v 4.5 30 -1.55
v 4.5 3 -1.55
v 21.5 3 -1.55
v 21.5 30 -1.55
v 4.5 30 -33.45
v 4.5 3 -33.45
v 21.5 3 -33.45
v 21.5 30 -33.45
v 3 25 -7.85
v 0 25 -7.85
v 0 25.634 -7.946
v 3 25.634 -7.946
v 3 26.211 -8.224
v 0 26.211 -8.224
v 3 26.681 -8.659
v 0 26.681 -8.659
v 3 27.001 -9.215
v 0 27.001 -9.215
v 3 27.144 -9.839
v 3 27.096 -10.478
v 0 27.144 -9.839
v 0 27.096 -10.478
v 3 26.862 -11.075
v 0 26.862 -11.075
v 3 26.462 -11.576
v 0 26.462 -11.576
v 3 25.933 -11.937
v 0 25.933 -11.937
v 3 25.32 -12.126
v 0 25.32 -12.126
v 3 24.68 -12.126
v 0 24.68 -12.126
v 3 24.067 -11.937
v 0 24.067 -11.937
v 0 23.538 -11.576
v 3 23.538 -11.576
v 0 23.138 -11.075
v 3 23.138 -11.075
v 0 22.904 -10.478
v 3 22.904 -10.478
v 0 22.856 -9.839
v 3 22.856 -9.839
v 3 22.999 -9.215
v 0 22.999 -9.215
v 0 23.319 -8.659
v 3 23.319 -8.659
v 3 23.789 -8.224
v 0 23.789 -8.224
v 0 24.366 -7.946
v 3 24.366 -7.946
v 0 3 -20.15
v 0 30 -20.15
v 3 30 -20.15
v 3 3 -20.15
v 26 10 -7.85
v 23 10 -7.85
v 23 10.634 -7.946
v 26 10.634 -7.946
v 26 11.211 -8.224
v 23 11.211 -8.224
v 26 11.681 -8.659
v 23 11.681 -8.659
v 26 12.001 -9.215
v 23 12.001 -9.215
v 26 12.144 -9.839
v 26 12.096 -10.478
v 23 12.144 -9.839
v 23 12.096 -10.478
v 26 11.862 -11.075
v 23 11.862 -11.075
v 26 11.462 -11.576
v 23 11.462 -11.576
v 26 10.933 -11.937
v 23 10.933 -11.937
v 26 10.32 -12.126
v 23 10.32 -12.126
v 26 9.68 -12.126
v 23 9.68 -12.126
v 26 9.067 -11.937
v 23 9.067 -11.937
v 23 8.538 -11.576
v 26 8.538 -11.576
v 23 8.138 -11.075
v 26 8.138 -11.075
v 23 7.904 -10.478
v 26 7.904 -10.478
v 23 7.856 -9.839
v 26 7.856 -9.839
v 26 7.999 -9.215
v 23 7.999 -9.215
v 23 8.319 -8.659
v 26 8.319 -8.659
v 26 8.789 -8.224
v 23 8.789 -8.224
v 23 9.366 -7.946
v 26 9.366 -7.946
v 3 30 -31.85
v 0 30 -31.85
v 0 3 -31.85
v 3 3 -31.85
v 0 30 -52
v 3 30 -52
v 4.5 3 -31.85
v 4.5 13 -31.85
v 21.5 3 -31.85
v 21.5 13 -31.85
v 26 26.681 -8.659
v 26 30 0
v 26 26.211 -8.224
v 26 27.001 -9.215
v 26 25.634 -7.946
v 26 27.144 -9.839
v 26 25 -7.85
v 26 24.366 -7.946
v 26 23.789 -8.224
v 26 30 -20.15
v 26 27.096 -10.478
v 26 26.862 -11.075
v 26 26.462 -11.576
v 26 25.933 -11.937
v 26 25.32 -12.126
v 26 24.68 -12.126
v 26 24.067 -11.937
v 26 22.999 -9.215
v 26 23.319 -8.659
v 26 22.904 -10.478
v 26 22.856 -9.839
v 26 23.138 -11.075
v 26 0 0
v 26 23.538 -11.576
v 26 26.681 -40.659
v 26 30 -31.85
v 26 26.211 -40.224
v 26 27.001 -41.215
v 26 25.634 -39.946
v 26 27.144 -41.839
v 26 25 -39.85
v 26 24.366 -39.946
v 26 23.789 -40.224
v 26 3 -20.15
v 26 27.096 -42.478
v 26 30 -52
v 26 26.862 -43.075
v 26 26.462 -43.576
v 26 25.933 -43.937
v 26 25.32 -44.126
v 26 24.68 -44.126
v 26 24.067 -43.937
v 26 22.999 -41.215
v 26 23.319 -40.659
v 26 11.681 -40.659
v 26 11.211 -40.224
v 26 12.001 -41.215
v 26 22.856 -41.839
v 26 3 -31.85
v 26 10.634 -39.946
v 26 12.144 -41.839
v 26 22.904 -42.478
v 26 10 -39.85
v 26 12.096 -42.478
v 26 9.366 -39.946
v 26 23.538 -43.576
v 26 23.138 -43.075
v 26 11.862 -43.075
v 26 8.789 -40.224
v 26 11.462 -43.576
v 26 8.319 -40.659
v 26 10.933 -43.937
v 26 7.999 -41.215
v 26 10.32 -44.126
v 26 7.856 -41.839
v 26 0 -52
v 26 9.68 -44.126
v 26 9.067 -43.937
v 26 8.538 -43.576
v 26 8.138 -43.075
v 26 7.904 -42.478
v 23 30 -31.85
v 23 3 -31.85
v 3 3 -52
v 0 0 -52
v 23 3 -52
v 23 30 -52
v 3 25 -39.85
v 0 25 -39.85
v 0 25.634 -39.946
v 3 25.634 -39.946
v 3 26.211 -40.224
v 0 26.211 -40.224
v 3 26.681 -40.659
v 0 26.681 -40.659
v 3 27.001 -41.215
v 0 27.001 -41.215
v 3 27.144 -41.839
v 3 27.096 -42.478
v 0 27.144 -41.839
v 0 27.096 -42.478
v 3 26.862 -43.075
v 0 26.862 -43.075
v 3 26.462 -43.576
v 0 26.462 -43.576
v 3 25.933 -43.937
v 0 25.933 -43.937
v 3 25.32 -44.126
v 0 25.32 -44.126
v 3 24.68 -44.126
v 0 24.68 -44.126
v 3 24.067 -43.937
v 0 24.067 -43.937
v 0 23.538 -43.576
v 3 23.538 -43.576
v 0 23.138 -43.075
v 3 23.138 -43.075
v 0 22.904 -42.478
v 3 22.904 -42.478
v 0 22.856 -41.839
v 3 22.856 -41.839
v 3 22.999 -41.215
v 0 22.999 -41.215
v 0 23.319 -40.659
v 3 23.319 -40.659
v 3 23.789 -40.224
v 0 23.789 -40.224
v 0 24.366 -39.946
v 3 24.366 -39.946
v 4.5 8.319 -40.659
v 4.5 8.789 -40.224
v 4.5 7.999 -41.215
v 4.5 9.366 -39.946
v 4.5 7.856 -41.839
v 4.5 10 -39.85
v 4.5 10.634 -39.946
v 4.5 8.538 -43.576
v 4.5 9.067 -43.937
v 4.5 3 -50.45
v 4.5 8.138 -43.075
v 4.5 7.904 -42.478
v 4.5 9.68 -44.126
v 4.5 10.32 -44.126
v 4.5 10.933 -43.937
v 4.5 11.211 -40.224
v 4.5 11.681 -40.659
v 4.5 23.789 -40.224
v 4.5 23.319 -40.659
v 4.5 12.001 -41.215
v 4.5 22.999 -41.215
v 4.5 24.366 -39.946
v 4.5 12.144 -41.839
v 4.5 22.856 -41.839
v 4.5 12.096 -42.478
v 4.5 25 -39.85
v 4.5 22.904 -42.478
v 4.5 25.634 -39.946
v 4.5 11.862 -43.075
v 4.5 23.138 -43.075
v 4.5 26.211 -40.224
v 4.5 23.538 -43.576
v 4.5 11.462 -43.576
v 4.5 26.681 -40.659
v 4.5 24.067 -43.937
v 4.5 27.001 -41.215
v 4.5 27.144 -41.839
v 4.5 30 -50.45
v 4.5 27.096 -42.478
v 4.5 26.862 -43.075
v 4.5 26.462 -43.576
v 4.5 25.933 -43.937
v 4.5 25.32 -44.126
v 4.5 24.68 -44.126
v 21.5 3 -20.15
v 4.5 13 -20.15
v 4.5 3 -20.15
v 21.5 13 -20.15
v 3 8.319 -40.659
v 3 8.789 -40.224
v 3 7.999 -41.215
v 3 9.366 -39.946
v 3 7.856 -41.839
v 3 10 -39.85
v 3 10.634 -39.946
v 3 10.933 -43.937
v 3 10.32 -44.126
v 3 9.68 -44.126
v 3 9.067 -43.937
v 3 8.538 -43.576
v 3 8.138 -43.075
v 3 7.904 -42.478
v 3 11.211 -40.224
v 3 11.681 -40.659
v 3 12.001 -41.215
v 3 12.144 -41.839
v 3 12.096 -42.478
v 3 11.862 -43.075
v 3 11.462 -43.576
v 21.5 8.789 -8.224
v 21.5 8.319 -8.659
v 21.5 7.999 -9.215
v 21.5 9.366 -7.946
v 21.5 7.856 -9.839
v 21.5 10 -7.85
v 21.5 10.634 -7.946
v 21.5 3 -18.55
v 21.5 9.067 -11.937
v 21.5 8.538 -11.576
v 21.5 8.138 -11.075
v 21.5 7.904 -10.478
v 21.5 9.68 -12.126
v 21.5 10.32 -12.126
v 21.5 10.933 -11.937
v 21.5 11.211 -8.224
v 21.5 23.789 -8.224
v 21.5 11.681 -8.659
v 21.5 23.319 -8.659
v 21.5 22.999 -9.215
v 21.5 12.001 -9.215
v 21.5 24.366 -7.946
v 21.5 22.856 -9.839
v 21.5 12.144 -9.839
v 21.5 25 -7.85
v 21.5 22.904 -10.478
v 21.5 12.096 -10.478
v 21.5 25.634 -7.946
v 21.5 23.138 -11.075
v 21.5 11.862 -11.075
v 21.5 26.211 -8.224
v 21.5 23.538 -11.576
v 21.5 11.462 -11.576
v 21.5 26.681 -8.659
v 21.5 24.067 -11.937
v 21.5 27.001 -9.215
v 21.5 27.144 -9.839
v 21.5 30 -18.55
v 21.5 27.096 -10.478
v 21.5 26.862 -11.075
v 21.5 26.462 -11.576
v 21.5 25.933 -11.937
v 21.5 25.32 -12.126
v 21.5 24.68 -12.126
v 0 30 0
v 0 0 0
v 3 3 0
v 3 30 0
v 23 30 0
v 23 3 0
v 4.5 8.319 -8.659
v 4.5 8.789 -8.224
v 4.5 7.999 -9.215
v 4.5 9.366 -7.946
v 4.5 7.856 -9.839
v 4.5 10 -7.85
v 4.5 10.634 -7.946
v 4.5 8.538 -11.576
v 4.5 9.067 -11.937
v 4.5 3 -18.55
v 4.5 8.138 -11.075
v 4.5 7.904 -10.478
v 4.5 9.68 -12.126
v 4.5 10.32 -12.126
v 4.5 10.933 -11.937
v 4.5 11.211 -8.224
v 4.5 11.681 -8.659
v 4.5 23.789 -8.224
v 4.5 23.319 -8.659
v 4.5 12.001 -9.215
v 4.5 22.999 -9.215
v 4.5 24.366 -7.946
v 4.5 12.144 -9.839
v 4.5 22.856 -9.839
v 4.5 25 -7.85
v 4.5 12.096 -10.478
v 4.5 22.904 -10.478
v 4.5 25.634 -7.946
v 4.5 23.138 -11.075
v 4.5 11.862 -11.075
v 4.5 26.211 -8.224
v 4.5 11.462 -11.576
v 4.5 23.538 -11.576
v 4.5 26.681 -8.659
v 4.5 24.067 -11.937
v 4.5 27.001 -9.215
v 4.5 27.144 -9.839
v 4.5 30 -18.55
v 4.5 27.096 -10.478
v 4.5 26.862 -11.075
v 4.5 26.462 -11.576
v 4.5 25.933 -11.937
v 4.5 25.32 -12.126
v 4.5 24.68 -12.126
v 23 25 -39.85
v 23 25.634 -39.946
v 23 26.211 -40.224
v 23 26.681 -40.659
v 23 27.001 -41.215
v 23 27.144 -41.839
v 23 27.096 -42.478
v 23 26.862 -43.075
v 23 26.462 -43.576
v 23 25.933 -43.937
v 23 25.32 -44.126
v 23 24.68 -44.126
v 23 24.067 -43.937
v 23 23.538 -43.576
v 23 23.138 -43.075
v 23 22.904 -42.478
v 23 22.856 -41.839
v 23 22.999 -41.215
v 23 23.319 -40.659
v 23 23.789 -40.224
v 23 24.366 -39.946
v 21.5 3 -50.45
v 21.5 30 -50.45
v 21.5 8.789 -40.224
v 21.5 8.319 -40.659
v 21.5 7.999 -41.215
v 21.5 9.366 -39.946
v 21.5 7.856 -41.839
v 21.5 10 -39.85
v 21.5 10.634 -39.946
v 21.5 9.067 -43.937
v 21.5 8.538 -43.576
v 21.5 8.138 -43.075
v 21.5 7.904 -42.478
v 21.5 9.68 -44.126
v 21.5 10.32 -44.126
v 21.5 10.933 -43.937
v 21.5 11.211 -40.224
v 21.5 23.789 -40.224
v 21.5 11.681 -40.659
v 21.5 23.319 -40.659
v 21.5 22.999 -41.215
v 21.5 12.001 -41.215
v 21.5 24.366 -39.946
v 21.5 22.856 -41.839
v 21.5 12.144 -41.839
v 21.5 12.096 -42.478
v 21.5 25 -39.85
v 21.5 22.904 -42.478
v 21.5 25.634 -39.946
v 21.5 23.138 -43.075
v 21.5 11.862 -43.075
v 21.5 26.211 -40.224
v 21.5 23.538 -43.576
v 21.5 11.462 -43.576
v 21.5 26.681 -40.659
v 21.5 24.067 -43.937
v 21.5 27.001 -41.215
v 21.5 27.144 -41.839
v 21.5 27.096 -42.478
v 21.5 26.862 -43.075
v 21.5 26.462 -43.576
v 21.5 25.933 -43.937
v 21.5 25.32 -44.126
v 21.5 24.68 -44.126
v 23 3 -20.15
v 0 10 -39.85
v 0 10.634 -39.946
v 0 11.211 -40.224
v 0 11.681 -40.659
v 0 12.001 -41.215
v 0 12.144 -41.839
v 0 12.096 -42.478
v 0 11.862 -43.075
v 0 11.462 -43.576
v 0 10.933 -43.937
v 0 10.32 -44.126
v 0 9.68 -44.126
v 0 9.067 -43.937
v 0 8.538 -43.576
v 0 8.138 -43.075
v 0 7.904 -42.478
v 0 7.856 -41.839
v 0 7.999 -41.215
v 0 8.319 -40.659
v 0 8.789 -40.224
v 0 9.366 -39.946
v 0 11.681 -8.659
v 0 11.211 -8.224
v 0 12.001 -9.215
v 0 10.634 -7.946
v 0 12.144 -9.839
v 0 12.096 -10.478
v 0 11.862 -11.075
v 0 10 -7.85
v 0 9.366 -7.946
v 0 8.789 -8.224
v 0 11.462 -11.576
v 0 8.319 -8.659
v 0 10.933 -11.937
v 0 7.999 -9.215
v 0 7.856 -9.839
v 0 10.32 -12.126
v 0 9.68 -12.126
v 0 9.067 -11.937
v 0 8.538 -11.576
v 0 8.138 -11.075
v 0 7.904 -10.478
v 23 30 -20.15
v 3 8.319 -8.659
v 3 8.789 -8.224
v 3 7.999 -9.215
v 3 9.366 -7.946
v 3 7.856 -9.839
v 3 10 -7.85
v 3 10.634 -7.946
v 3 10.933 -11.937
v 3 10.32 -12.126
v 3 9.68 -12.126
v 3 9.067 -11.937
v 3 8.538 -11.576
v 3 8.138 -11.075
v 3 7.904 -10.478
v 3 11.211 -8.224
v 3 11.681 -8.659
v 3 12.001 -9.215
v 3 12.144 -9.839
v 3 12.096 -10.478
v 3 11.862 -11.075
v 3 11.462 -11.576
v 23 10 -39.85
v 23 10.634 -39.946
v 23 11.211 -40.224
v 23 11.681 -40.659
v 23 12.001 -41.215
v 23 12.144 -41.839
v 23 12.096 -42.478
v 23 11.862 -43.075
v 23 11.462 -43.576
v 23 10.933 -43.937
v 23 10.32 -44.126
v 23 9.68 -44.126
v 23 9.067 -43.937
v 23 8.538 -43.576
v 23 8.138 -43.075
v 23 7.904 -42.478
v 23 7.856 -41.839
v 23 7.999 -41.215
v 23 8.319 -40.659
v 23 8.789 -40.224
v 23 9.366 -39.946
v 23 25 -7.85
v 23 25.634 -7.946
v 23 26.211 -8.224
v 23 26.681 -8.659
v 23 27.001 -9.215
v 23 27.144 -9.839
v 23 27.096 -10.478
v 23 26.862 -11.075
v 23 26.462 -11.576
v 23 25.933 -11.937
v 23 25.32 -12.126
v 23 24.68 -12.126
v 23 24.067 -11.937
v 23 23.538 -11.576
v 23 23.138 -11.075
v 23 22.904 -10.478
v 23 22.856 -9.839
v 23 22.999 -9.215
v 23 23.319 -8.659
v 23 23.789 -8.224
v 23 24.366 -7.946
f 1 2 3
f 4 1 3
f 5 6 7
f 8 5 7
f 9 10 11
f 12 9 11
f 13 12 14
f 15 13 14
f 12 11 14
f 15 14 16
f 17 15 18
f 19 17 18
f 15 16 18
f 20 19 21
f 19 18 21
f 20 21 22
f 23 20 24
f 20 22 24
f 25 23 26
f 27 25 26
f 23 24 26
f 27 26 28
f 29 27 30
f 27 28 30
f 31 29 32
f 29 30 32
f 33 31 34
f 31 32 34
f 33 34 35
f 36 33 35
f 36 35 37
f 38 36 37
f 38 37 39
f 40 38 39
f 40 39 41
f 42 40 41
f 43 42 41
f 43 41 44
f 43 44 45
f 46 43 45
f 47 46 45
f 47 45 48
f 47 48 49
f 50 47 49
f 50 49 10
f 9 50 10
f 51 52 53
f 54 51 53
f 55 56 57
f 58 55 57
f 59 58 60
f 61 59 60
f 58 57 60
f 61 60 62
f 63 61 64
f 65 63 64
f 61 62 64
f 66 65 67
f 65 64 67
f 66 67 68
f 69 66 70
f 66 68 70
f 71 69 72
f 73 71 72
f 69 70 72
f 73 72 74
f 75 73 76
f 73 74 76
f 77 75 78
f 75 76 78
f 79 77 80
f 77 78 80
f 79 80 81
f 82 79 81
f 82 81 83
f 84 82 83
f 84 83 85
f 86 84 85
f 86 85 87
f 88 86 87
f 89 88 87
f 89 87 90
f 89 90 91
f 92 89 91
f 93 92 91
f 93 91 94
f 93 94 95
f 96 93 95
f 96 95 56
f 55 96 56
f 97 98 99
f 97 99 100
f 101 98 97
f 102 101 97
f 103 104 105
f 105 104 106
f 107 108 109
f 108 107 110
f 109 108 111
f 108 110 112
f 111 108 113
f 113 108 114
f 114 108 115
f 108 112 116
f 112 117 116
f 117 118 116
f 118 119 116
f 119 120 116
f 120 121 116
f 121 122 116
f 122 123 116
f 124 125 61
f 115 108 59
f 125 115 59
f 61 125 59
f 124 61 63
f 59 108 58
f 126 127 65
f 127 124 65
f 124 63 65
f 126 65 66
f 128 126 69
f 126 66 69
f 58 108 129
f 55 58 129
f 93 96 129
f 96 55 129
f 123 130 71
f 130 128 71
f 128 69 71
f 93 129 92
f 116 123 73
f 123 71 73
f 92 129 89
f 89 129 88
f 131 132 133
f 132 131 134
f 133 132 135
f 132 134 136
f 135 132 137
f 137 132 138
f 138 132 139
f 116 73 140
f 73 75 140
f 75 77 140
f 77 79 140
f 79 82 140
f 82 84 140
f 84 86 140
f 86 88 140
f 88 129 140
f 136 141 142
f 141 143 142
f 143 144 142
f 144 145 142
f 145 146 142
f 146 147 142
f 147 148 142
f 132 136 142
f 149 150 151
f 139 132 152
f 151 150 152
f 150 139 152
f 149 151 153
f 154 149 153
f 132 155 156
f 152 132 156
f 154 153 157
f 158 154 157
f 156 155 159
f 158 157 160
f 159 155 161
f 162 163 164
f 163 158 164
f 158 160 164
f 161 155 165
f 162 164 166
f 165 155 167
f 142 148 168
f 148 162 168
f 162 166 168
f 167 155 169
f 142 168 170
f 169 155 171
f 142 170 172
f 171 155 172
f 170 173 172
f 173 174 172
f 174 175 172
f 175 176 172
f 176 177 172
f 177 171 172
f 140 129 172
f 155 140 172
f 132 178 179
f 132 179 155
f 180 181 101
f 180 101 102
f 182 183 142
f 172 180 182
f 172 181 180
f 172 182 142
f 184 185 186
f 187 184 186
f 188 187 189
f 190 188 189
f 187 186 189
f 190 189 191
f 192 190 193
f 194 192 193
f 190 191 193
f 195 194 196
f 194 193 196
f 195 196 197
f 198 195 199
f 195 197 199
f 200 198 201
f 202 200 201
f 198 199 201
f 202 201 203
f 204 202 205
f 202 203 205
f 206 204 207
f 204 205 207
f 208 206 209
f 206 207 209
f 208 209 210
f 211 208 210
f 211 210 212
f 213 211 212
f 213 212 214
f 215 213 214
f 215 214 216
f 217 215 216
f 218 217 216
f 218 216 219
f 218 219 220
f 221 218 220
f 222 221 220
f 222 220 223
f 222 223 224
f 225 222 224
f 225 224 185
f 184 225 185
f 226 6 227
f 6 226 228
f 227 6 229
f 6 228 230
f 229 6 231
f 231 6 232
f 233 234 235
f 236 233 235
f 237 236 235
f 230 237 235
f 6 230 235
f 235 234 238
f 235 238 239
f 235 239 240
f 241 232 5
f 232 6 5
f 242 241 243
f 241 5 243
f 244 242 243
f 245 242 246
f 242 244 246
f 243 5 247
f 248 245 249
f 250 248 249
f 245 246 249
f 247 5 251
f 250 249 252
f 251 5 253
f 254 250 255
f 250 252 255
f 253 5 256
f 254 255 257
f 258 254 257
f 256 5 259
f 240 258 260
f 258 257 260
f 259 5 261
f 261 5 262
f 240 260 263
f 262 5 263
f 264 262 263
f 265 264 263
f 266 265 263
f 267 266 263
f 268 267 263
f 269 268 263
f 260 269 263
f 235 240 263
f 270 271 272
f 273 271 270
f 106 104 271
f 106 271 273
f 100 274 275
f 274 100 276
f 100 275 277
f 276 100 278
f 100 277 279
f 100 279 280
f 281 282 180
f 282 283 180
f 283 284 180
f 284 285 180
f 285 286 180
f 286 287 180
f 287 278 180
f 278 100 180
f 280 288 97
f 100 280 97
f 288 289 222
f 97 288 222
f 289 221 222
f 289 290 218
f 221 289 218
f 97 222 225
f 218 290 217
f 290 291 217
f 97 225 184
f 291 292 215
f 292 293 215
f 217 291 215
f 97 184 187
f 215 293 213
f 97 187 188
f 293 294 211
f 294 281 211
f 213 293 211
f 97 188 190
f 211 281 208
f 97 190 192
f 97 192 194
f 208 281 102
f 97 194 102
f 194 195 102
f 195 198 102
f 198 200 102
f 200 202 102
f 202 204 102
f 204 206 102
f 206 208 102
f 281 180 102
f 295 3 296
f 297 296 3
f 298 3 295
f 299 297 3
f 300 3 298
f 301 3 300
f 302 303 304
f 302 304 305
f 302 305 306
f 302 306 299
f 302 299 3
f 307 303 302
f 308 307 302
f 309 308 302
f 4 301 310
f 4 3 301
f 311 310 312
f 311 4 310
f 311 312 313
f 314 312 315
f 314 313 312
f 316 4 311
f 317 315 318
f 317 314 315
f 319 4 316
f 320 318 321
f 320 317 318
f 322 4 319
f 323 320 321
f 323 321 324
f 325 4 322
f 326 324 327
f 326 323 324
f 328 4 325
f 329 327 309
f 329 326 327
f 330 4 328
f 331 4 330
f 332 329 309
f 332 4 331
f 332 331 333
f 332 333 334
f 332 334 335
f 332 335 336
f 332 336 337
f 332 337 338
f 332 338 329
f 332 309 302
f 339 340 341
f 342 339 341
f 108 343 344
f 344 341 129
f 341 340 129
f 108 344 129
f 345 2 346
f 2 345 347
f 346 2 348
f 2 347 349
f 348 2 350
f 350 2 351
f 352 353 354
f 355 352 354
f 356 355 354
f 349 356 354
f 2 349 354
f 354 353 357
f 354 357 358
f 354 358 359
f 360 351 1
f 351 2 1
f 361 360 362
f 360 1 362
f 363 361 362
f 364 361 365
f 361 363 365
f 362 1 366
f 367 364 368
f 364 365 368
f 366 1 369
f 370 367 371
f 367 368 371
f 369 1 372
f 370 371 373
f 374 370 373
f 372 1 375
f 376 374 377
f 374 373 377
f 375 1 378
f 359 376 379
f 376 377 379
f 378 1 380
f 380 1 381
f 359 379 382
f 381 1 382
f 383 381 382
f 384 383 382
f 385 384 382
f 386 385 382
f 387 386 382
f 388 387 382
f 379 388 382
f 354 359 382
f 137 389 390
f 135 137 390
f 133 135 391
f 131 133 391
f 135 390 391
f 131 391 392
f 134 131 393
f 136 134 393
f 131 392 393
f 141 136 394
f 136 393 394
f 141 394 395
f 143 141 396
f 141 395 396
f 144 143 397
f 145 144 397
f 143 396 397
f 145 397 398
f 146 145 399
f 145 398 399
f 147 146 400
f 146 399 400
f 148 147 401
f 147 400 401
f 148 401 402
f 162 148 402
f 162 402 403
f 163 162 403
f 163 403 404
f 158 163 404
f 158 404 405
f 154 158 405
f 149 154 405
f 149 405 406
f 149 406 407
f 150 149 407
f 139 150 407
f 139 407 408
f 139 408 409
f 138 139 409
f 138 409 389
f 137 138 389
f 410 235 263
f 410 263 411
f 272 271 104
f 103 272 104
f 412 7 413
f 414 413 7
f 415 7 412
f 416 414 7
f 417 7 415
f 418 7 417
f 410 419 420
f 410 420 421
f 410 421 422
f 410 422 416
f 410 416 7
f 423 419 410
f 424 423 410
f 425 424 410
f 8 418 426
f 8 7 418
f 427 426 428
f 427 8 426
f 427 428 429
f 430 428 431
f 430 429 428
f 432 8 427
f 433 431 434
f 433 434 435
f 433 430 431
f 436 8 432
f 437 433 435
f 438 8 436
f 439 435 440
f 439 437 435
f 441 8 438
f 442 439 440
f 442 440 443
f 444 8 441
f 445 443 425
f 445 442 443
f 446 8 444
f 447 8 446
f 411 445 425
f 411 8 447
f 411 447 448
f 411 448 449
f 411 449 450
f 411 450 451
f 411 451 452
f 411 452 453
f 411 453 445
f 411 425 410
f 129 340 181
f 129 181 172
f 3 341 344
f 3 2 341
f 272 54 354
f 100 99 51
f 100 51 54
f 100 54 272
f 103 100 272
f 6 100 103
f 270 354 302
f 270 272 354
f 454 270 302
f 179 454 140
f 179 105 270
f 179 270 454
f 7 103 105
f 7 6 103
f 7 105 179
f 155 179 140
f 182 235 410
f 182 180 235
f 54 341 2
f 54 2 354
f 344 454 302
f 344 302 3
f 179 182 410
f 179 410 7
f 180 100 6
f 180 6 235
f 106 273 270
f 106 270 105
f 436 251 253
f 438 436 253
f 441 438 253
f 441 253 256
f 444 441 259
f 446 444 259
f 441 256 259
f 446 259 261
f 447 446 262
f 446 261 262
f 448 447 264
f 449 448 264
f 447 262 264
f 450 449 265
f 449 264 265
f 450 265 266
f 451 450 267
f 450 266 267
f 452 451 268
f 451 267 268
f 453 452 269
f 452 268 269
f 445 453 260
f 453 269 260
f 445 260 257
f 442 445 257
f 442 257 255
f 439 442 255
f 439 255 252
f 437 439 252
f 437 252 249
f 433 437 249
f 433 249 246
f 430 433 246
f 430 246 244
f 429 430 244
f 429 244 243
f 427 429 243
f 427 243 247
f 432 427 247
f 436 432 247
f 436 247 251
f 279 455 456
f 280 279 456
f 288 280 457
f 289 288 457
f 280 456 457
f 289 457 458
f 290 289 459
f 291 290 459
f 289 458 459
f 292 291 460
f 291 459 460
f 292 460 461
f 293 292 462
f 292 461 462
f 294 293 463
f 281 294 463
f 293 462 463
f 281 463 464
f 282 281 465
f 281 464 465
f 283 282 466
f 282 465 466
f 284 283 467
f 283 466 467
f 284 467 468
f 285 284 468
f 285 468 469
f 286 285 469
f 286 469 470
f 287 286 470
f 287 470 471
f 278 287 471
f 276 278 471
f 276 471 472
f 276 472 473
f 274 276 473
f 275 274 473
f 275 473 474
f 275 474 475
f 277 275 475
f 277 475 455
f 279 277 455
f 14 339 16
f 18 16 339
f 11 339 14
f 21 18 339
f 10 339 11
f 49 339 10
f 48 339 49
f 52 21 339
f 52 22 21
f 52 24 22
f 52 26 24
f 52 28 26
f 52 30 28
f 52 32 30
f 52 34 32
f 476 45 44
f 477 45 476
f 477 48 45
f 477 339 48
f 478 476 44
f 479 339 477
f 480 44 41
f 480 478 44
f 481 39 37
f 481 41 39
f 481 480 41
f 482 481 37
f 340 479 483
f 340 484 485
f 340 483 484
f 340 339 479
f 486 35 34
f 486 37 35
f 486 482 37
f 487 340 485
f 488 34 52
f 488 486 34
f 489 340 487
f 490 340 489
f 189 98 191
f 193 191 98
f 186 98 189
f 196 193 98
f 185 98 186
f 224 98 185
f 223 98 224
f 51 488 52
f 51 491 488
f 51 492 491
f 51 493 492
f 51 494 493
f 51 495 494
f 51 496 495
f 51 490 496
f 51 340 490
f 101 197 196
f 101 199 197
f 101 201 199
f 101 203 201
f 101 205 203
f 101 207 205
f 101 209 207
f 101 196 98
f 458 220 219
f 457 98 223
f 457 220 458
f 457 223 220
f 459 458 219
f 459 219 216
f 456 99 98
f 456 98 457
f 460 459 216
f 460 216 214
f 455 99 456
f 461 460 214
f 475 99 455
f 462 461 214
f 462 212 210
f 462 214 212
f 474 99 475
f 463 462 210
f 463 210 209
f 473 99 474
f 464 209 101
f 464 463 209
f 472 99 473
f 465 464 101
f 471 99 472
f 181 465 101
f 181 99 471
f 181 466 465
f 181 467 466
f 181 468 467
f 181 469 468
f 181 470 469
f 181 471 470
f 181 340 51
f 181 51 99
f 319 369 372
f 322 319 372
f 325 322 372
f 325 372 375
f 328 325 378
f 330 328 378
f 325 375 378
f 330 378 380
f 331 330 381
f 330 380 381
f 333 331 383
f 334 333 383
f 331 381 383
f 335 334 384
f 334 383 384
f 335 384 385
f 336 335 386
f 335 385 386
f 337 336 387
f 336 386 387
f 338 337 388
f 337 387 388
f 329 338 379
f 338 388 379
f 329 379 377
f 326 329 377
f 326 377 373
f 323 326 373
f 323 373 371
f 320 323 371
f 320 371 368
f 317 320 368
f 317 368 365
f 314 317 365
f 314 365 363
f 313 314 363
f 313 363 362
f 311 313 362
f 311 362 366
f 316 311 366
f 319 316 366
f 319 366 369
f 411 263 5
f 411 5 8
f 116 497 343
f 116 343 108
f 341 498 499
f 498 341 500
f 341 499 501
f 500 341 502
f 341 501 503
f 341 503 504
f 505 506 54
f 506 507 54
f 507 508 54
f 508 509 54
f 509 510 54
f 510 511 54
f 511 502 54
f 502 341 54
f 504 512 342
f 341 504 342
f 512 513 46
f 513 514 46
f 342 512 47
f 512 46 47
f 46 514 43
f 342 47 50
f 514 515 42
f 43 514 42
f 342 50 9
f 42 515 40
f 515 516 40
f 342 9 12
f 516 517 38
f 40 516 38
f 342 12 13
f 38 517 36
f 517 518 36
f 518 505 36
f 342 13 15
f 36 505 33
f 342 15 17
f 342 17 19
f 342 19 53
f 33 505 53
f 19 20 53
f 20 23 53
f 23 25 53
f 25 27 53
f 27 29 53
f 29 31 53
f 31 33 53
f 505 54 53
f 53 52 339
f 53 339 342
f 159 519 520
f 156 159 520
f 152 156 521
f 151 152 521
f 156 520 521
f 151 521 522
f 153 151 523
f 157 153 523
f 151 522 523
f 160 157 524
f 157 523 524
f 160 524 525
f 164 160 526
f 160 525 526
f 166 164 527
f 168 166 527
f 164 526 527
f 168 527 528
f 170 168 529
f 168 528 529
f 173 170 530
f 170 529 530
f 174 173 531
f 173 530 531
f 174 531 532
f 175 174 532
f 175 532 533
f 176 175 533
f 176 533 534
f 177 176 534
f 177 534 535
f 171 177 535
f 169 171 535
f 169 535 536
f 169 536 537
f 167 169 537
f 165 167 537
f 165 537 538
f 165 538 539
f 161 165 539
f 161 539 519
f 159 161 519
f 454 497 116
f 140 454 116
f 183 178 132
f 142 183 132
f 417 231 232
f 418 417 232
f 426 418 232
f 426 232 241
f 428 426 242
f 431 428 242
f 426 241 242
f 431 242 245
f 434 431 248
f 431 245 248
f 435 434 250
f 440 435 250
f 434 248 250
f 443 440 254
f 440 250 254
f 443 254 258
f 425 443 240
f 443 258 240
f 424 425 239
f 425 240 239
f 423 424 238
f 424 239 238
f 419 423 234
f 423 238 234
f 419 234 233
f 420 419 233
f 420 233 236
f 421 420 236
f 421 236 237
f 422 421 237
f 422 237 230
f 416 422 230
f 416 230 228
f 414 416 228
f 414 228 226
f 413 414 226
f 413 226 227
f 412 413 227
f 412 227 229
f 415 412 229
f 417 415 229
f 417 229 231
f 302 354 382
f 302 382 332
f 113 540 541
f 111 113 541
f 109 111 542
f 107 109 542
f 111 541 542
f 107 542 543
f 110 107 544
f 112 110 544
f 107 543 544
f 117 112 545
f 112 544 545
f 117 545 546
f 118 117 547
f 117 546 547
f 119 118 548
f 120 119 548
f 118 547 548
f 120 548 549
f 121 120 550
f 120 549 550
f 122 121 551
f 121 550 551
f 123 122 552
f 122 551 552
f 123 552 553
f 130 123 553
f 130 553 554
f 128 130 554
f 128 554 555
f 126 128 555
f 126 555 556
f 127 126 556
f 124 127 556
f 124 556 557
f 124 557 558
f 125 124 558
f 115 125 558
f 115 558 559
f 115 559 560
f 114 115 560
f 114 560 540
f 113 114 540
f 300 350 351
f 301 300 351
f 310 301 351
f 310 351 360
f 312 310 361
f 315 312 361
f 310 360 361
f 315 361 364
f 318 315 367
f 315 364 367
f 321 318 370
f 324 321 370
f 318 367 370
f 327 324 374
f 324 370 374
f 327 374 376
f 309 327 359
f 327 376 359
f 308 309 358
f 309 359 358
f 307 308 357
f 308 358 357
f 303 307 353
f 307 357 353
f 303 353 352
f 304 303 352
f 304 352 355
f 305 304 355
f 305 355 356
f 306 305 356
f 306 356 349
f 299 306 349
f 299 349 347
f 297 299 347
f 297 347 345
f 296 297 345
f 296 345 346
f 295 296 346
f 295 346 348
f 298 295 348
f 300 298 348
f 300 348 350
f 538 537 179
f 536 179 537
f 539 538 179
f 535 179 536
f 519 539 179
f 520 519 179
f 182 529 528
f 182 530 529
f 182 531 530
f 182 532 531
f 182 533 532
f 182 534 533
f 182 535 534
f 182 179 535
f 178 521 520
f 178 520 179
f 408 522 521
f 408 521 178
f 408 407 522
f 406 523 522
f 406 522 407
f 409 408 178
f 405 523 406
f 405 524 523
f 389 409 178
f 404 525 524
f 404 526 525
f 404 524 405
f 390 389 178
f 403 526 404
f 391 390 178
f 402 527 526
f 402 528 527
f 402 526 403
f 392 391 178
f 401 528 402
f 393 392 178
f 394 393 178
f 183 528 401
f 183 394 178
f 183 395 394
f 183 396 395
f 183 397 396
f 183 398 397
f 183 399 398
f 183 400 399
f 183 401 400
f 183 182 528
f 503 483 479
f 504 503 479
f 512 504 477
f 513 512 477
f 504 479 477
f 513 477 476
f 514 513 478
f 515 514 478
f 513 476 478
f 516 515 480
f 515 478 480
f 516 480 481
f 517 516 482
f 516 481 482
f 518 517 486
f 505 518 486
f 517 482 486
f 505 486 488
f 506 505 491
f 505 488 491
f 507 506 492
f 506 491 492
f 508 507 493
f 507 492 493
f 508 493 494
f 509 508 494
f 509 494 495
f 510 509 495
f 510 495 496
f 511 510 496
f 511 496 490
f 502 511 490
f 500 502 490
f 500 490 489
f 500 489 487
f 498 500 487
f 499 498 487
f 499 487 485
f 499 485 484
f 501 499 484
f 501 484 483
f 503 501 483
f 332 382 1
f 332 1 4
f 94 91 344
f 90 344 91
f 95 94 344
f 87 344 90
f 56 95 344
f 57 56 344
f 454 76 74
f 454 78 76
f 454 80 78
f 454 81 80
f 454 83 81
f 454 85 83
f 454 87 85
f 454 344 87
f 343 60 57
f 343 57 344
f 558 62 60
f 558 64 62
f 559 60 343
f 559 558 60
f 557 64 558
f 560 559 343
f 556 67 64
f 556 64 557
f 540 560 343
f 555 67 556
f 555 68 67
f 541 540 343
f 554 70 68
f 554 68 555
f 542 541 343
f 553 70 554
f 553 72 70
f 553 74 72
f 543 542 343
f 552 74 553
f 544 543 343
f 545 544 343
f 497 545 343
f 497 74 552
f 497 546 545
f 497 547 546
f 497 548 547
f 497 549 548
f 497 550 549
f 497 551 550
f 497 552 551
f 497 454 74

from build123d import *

# Parameters (mm, degrees)
SKETCH1_W           = 26
SKETCH1_H           = 52
BOSS_EXTRUDE1_DEPTH = 30
SKETCH2_W           = 1.5
SKETCH2_H           = 27
CUT_EXTRUDE1_DEPTH  = 53
SKETCH3_OUTSIDE_W   = 41.084
SKETCH3_OUTSIDE_H   = 67.084
SKETCH3_OUTSIDE_W_2 = 17
SKETCH3_OUTSIDE_H_2 = 17
SKETCH3_OUTSIDE_H_3 = 11.7
SKETCH3_OUTSIDE_W_3 = 3
SKETCH3_OUTSIDE_H_4 = 20.15
CUT_EXTRUDE2_DEPTH  = 27
SKETCH4_W           = 17
SKETCH4_H           = 11.7
CUT_EXTRUDE3_DEPTH  = 17
SKETCH5_R           = 2.15
CUT_EXTRUDE4_DEPTH  = 27


with BuildPart() as part:
    # Sketch1 → Boss-Extrude1 (new body)
    with BuildSketch(Plane(origin=(0, 0, 0), x_dir=(1, 0, 0), z_dir=(0, 1, 0))):
        with Locations((13, 26)):
            Rectangle(SKETCH1_W, SKETCH1_H)
    extrude(amount=BOSS_EXTRUDE1_DEPTH)

    # Sketch2 → Cut-Extrude1 (cut, through all)
    with BuildSketch(Plane(origin=(0, 0, -52), x_dir=(-1, 0, 0), z_dir=(0, 0, -1))):
        with Locations((-22.25, 16.5)):
            Rectangle(SKETCH2_W, SKETCH2_H)
        with Locations((-3.75, 16.5)):
            Rectangle(SKETCH2_W, SKETCH2_H)
    extrude(amount=-CUT_EXTRUDE1_DEPTH, mode=Mode.SUBTRACT)

    # Sketch3 outside → Cut-Extrude2 (cut)
    with BuildSketch(Plane(origin=(0, 30, 0), x_dir=(1, 0, 0), z_dir=(0, 1, 0))):
        with Locations((13, 26)):
            Rectangle(SKETCH3_OUTSIDE_W, SKETCH3_OUTSIDE_H)
        with Locations((13, 41.95)):
            Rectangle(SKETCH3_OUTSIDE_W_2, SKETCH3_OUTSIDE_H_2, mode=Mode.SUBTRACT)
        with Locations((13, 26)):
            Rectangle(SKETCH3_OUTSIDE_W_2, SKETCH3_OUTSIDE_H_3, mode=Mode.SUBTRACT)
        with Locations((13, 10.05)):
            Rectangle(SKETCH3_OUTSIDE_W_2, SKETCH3_OUTSIDE_H_2, mode=Mode.SUBTRACT)
        with Locations((1.5, 41.925)):
            Rectangle(SKETCH3_OUTSIDE_W_3, SKETCH3_OUTSIDE_H_4, mode=Mode.SUBTRACT)
        with Locations((24.5, 41.925)):
            Rectangle(SKETCH3_OUTSIDE_W_3, SKETCH3_OUTSIDE_H_4, mode=Mode.SUBTRACT)
        with Locations((1.5, 10.075)):
            Rectangle(SKETCH3_OUTSIDE_W_3, SKETCH3_OUTSIDE_H_4, mode=Mode.SUBTRACT)
        with Locations((24.5, 10.075)):
            Rectangle(SKETCH3_OUTSIDE_W_3, SKETCH3_OUTSIDE_H_4, mode=Mode.SUBTRACT)
    extrude(amount=-CUT_EXTRUDE2_DEPTH, mode=Mode.SUBTRACT)

    # Sketch4 → Cut-Extrude3 (cut)
    with BuildSketch(Plane(origin=(0, 30, 0), x_dir=(1, 0, 0), z_dir=(0, 1, 0))):
        with Locations((13, 26)):
            Rectangle(SKETCH4_W, SKETCH4_H)
    extrude(amount=-CUT_EXTRUDE3_DEPTH, mode=Mode.SUBTRACT)

    # Sketch5 → Cut-Extrude4 (cut, through all)
    with BuildSketch(Plane.ZY):
        with Locations((-42, 25)):
            Circle(SKETCH5_R)
        with Locations((-42, 10)):
            Circle(SKETCH5_R)
        with Locations((-10, 25)):
            Circle(SKETCH5_R)
        with Locations((-10, 10)):
            Circle(SKETCH5_R)
    extrude(amount=-CUT_EXTRUDE4_DEPTH, mode=Mode.SUBTRACT)


solid = part.part
